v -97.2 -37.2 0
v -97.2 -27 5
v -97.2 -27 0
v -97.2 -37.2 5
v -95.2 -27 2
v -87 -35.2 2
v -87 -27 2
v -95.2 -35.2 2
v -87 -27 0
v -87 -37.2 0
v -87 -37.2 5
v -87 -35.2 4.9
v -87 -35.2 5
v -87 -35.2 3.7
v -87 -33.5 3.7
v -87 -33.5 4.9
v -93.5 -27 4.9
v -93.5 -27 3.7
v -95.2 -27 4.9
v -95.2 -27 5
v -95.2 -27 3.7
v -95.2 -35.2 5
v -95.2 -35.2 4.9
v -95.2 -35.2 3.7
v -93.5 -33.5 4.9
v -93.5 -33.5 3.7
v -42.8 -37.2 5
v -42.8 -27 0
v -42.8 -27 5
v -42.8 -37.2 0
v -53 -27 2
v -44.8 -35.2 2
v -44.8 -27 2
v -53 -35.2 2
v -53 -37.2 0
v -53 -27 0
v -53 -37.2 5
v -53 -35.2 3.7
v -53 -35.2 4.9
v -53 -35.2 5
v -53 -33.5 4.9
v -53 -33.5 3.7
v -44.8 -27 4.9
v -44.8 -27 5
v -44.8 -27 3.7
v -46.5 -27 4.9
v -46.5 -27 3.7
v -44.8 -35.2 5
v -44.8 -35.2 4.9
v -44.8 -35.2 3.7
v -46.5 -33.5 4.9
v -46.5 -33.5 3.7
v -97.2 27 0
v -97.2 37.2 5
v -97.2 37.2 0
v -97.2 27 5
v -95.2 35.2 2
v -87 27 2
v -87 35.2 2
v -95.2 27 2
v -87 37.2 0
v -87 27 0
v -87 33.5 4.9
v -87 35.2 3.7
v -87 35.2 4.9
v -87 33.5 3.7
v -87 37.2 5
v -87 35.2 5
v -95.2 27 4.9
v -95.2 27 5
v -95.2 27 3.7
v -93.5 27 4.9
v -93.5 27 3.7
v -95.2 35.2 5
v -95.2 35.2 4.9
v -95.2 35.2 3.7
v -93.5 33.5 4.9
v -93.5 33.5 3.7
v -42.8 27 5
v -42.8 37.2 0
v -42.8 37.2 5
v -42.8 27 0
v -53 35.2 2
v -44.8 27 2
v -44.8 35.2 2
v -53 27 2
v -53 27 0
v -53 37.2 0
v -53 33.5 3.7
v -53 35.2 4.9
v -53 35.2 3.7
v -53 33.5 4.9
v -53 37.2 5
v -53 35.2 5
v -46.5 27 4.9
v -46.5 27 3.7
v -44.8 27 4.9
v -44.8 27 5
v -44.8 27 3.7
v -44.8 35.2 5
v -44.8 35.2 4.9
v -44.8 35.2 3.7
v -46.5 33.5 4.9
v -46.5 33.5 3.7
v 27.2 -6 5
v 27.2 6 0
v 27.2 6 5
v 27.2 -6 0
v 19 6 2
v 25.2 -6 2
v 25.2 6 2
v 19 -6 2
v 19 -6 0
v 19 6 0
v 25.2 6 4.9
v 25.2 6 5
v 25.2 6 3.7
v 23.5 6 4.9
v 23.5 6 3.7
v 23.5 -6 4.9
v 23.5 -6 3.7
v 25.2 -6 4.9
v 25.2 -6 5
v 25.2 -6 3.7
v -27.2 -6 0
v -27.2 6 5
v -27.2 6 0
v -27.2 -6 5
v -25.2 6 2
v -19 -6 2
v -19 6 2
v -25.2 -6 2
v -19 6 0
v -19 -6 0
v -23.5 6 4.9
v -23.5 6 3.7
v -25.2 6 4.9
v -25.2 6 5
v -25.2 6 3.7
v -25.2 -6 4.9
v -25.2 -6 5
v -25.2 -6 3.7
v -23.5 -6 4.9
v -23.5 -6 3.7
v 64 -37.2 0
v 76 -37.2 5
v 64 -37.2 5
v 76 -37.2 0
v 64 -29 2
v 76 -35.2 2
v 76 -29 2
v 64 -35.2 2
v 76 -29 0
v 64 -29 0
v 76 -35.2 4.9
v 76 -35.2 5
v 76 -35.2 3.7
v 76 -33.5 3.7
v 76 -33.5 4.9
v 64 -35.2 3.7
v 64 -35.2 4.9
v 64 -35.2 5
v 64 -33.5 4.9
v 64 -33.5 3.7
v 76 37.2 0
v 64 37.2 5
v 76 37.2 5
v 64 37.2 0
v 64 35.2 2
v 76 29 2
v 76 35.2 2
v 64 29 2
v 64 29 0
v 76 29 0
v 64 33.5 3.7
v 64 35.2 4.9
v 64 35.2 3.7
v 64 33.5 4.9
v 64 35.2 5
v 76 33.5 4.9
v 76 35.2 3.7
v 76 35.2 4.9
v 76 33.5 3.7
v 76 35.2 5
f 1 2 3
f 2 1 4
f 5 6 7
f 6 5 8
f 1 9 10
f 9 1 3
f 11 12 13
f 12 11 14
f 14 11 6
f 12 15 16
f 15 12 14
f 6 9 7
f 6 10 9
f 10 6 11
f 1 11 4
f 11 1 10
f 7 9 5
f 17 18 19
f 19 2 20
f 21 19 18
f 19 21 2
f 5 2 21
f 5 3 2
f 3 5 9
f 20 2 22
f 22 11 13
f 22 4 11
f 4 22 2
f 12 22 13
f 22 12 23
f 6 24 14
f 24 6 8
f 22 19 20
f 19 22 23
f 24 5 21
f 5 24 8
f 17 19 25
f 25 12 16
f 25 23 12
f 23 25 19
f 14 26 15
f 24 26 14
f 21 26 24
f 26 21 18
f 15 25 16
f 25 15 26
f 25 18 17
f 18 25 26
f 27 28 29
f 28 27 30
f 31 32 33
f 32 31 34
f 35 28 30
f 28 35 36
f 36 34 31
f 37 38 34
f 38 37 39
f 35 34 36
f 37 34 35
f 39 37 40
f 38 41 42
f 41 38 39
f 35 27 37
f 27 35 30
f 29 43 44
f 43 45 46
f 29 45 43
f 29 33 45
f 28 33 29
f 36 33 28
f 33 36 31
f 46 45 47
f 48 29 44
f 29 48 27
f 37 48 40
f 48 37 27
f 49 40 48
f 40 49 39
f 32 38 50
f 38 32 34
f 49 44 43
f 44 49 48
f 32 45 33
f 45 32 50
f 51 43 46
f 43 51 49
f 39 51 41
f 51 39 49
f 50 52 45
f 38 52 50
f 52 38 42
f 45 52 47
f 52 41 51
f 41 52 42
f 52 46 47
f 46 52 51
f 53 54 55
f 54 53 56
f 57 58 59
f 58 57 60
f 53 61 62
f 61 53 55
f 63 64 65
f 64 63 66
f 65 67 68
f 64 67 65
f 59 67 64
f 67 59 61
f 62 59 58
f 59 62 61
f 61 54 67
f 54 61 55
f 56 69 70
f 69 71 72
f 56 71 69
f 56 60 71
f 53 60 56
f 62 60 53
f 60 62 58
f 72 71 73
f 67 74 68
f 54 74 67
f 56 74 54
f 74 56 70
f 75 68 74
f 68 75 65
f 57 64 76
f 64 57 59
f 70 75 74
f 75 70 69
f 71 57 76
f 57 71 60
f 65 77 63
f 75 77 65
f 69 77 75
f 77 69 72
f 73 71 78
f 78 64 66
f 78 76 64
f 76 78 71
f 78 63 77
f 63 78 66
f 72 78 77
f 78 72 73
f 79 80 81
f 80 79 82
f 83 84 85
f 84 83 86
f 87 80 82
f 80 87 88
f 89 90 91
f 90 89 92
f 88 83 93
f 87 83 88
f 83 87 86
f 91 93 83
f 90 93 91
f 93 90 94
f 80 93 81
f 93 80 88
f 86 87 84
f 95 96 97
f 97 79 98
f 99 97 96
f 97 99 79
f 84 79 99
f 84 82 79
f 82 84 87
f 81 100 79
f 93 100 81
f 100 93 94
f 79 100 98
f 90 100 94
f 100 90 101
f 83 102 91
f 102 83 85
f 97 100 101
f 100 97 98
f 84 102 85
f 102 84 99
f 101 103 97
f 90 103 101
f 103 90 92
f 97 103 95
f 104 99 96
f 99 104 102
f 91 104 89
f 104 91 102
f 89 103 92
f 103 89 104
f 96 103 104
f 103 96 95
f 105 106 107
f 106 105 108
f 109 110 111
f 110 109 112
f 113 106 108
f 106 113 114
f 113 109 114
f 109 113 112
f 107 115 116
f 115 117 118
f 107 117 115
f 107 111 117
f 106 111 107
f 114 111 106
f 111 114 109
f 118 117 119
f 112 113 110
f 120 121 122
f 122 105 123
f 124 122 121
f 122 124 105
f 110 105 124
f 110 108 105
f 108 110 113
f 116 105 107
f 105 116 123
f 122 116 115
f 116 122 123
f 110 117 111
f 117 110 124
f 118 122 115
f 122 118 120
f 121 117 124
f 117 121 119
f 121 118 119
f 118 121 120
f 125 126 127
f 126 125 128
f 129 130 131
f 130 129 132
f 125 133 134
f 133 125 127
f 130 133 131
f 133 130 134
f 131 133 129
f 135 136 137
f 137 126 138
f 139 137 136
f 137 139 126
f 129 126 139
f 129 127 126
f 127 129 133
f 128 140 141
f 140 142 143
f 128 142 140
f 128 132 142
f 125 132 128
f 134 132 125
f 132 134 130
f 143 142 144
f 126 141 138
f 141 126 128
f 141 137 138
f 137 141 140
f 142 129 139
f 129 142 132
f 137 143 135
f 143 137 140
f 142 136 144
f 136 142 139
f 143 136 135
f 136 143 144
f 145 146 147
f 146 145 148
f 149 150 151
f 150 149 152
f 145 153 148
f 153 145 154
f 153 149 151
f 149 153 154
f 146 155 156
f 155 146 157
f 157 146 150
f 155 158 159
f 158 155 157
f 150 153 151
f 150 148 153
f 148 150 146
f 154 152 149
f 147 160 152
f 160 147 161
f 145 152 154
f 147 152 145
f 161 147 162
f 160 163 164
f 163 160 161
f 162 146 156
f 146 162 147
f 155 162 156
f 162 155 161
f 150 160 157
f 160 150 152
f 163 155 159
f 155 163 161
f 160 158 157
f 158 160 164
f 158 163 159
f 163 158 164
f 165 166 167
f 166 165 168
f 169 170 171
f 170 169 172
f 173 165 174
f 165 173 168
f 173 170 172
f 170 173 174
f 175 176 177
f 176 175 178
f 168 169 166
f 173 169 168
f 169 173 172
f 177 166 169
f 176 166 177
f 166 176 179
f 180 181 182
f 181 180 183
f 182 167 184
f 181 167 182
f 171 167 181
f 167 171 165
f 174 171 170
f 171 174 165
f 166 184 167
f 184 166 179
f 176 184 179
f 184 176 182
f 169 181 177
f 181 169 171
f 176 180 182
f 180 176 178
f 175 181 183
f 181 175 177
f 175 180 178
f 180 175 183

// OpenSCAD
// =====================================================================
//  pcb_holder — PCB retention by corner or edge (slide-in retainer).
//
//  DESIGNED companion (invented geometry, parametric) that holds a PCB. It is NOT a
//  press-fit clip (*snap-fit*): each holder is a simple capture —*ledge* below + *lip*
//  above, separated by = PCB thickness + clearance— with the INNER side open. There
//  are two holder types, combinable:
//    · CORNER: L-shaped bracket, registers the PCB in X and Y.
//    · EDGE: straight, captures one edge — side (X) or end (Y); its position along
//      the edge is parametric (shift), just like its size.
//
//  ASSEMBLY MODEL (the user's): TWO parts, each with its own holders; the PCB is placed
//  and the two parts close over it and are screwed EXTERNALLY (the screws come from the
//  host part, not from the holder). That is why the holders carry no lead-in chamfer:
//  the PCB does not slide, the parts do. The component delivers the holder as a POSITIVE
//  + anchors.
//
//  REUSABLE across projects: PCB footprint (width × length), thickness, and size +
//  position of each holder, all parametric. Single source: consumers import it, they do
//  not copy it. (The convention is that a catalog component is developed in its own bench
//  project; this one comes WITHOUT its bench — `projects/example/` merely consumes it.
//  See `components/CLAUDE.md` § What's here.)
//
//  Units mm. Local frame: PCB footprint CENTERED in XY (origin = center of the PCB);
//  z = 0 = seating face of the holders (host floor). The PCB sits at z = STANDOFF
//  (bottom face) .. STANDOFF + PCB_T (top face); the lip overhangs above it.
// =====================================================================

// ---------- Inputs (design defaults; ADJUST = tune with a test print) ----------
PCBH_PCB_T    = 1.5; // ADJUST: PCB thickness (≈1.5; depends on the PCB)
PCBH_REF_T    = 1.6; // REFERENCE PCB thickness (the thickest standard FR-4) used to level
                     // the TOP FACE of the clip: with `level_clip` (ON), a thinner PCB
                     // does not lower the clip — the lip grows upward to this reference
                     // plane, so every clip finishes at the SAME height. The compensation
                     // is never negative: a PCB THICKER than this follows its own
                     // thickness (the clip is not trimmed).
PCBH_FIT      = 0.2; // ADJUST: XY clearance between PCB edge and wall (per side)
PCBH_SLOT_CL  = 0.2; // ADJUST: vertical clearance (gap − PCB thickness): play under the lip
PCBH_CLIP_W   = 8;   // ADJUST: CORNER clip arm along the X edge
PCBH_CLIP_D   = 8;   // ADJUST: CORNER clip arm along the Y edge
PCBH_WALL     = 2;   // ADJUST: outer wall thickness
PCBH_STANDOFF = 2;   // ADJUST: ledge height (PCB above the host floor)
PCBH_LIP      = 1.5; // ADJUST: lip overhang over the PCB (inward)
PCBH_LIP_T    = 1.2; // ADJUST: lip thickness (Z)

// EDGE clip (side / end): captures ONE straight edge at a given position.
PCBH_EDGE_LEN   = 12; // ADJUST: edge-clip length along the edge
PCBH_EDGE_DEPTH = 6;  // ADJUST: clip reach inward under the PCB (perpendicular to the edge)

// Default PCB footprint (for preview/bench; the consumer passes its own).
PCBH_DEF_W = 50; // ADJUST: default PCB width (X)
PCBH_DEF_L = 70; // ADJUST: default PCB length (Y)

PCBH_OVER = 0.01; // overlap to avoid coplanar faces

// Total holder height = ledge + PCB slot + lip. With `level_clip` the top face is
// leveled to the reference PCB (`pcb_ref_t`), never below the real one.
function pcb_holder_height(pcb_t = PCBH_PCB_T, slot_cl = PCBH_SLOT_CL,
                           standoff = PCBH_STANDOFF, lip_t = PCBH_LIP_T,
                           pcb_ref_t = PCBH_REF_T, level_clip = true) =
  standoff + (level_clip ? max(pcb_t, pcb_ref_t) : pcb_t) + slot_cl + lip_t;

// ---------- Anchors + accessors (functions, NOT top-level vars) ----------
// XY center of a PCB corner (sx, sy ∈ {−1,1}).
function pcb_holder_corner_xy(sx, sy, width, length) = [sx * width / 2, sy * length / 2];

// anchor(name, ...): component reference.
//   "pcb_size" -> [W, L, pcb_t] · "seat_z" -> z of the PCB bottom face (= standoff)
//   "height" -> total holder height · "corner_lt/rt/lb/rb" -> [x, y, seat_z] of each corner
function pcb_holder_anchor(name, width = PCBH_DEF_W, length = PCBH_DEF_L,
                           pcb_t = PCBH_PCB_T, standoff = PCBH_STANDOFF,
                           pcb_ref_t = PCBH_REF_T, level_clip = true) =
    name == "pcb_size" ? [width, length, pcb_t]
  : name == "seat_z"   ? standoff
  : name == "height"   ? pcb_holder_height(pcb_t = pcb_t, standoff = standoff,
                                           pcb_ref_t = pcb_ref_t, level_clip = level_clip)
  : name == "corner_lb" ? [pcb_holder_corner_xy(-1, -1, width, length)[0], pcb_holder_corner_xy(-1, -1, width, length)[1], standoff]
  : name == "corner_rb" ? [pcb_holder_corner_xy( 1, -1, width, length)[0], pcb_holder_corner_xy( 1, -1, width, length)[1], standoff]
  : name == "corner_lt" ? [pcb_holder_corner_xy(-1,  1, width, length)[0], pcb_holder_corner_xy(-1,  1, width, length)[1], standoff]
  : name == "corner_rt" ? [pcb_holder_corner_xy( 1,  1, width, length)[0], pcb_holder_corner_xy( 1,  1, width, length)[1], standoff]
  : undef;

// ---------- Private helper: CORNER clip in the (+X,+Y) quadrant ----------
// Explicit coordinates at the +,+ corner; the other 3 via scale([sx,sy,1]) (mirror).
// L-shaped walls ONLY on the two OUTER edges (+X,+Y); the inner side (toward the
// center of the PCB) is left OPEN — the corner goes in there and the two halves meet.
// rim    = INWARD reach of the ledge/base under the PCB edge (thin rim; instead of
//          the solid clip_w×clip_d base). Default = clip_w (compat).
// base_h = height of the BASE/foot that extends the clip BEYOND the +Y edge of the PCB
//          (in a host printed on its side, that direction = toward the print bed). base_h<=0
//          → no base (the consumer adds the support, as before). The foot is a THIN
//          section (thickness `rim` in Z) that backs the overhang so it is not left in air.
module _pcb_holder_corner_pp(width, length, pcb_t, fit, slot_cl, clip_w, clip_d,
                             wall, standoff, lip, lip_t, rim, base_h,
                             pcb_ref_t, level_clip) {
  hw = width / 2;  hl = length / 2;
  xo = hw + fit;   yo = hl + fit;            // inner faces of the outer walls
  xout = xo + wall; yout = yo + wall;        // outer faces
  x_in = hw - clip_w; y_in = hl - clip_d;    // inward reach of the clip (X/Y edge)
  // eff_t levels the TOP FACE of the clip: with level_clip, a PCB thinner than the
  // reference does not lower the clip (the lip grows upward). It never trims below the
  // real PCB → the compensation is never negative.
  eff_t = level_clip ? max(pcb_t, pcb_ref_t) : pcb_t;
  Htop  = standoff + eff_t + slot_cl + lip_t;
  z_lip = standoff + pcb_t + slot_cl;        // bottom face of the lip (follows the REAL PCB)
  union() {
    // Ledge/base = L-shaped rim (reach `rim`), not a solid block → less material behind the PCB.
    translate([x_in, hl - rim, 0]) cube([xout - x_in, yout - (hl - rim), standoff]);   // +Y rim
    translate([hw - rim, y_in, 0]) cube([xout - (hw - rim), yout - y_in, standoff]);   // +X rim
    translate([x_in, yo, 0]) cube([xout - x_in, wall, Htop]);                     // +Y wall
    translate([xo, y_in, 0]) cube([wall, yout - y_in, Htop]);                     // +X wall
    translate([x_in, hl - lip, z_lip]) cube([xout - x_in, yout - (hl - lip), lip_t]); // +Y lip
    translate([hw - lip, y_in, z_lip]) cube([xout - (hw - lip), yout - y_in, lip_t]); // +X lip
    // BASE/foot: extends the clip beyond the +Y edge (toward the bed/floor) with the FULL
    // SECTION of the clip (z 0..Htop) → same width as the grip (no step) and solid down to
    // the floor. (The thin rim behind the PCB is the ledge above, a separate thing.)
    if (base_h > 0)
      translate([x_in, yout, 0]) cube([xout - x_in, base_h, Htop]);
  }
}

// ---------- POSITIVE — one CORNER clip (at corner sx,sy of the footprint) ----------
module pcb_holder_corner_clip(
  sx = 1, sy = 1,
  width = PCBH_DEF_W, length = PCBH_DEF_L,
  pcb_t = PCBH_PCB_T, fit = PCBH_FIT, slot_cl = PCBH_SLOT_CL,
  clip_w = PCBH_CLIP_W, clip_d = PCBH_CLIP_D, wall = PCBH_WALL,
  standoff = PCBH_STANDOFF, lip = PCBH_LIP, lip_t = PCBH_LIP_T,
  rim = undef, base_h = 0,
  pcb_ref_t = PCBH_REF_T, level_clip = true
) {
  // default rim = clip_w ("wide" base as before); pass it small for a thin rim.
  rim_e = is_undef(rim) ? clip_w : rim;
  // sx,sy ∈ {−1,1}: scale mirrors the +,+ corner to the requested quadrant (identity if 1).
  scale([sx, sy, 1])
    _pcb_holder_corner_pp(width, length, pcb_t, fit, slot_cl, clip_w, clip_d,
                          wall, standoff, lip, lip_t, rim_e, base_h,
                          pcb_ref_t, level_clip);
}

// ---------- Private helper: straight EDGE clip (canonical: +X edge at x=half) ----------
// A single outer wall + ledge + lip, inner side open. `pos` = center along the edge
// (shift); `len` = length; `depth` = reach inward under the PCB.
module _pcb_holder_edge_pp(half, pos, len, depth, pcb_t, fit, slot_cl,
                           wall, standoff, lip, lip_t, pcb_ref_t, level_clip) {
  xo = half + fit;  xout = xo + wall;
  x_in = half - depth;
  y0 = pos - len / 2;
  eff_t = level_clip ? max(pcb_t, pcb_ref_t) : pcb_t;  // levels the top face of the clip
  Htop  = standoff + eff_t + slot_cl + lip_t;
  z_lip = standoff + pcb_t + slot_cl;                  // lip follows the REAL PCB
  union() {
    translate([x_in, y0, 0]) cube([xout - x_in, len, standoff]);                  // ledge/base
    translate([xo, y0, 0]) cube([wall, len, Htop]);                               // outer wall
    translate([half - lip, y0, z_lip]) cube([xout - (half - lip), len, lip_t]);   // lip
  }
}

// ---------- POSITIVE — one EDGE clip (side / end) ----------
// side ∈ "left"|"right" (sides, X axis) | "bottom"|"top" (ends, Y axis).
// pos = SHIFT of the center along the edge (0 = centered; + toward the edge's +axis).
// len / depth = holder size (along the edge / inward).
module pcb_holder_edge_clip(
  side = "left", pos = 0, len = PCBH_EDGE_LEN, depth = PCBH_EDGE_DEPTH,
  width = PCBH_DEF_W, length = PCBH_DEF_L,
  pcb_t = PCBH_PCB_T, fit = PCBH_FIT, slot_cl = PCBH_SLOT_CL,
  wall = PCBH_WALL, standoff = PCBH_STANDOFF, lip = PCBH_LIP, lip_t = PCBH_LIP_T,
  pcb_ref_t = PCBH_REF_T, level_clip = true
) {
  hw = width / 2;  hl = length / 2;
  // Canonical = +X edge; the other 3 faces by mirror/rotation (they map the open side too).
  if (side == "right")
    _pcb_holder_edge_pp(hw, pos, len, depth, pcb_t, fit, slot_cl, wall, standoff, lip, lip_t, pcb_ref_t, level_clip);
  else if (side == "left")
    mirror([1, 0, 0]) _pcb_holder_edge_pp(hw, pos, len, depth, pcb_t, fit, slot_cl, wall, standoff, lip, lip_t, pcb_ref_t, level_clip);
  else if (side == "top")
    rotate([0, 0, 90]) _pcb_holder_edge_pp(hl, -pos, len, depth, pcb_t, fit, slot_cl, wall, standoff, lip, lip_t, pcb_ref_t, level_clip);
  else if (side == "bottom")
    rotate([0, 0, -90]) _pcb_holder_edge_pp(hl, pos, len, depth, pcb_t, fit, slot_cl, wall, standoff, lip, lip_t, pcb_ref_t, level_clip);
}

// ---------- POSITIVE — placement: corners and/or edges ----------
// corners = list of [sx,sy] (default all 4).
// edges   = list of [side, pos?, len?, depth?] — pos = shift (def 0), len/depth = holder
//           size (def PCBH_EDGE_LEN / PCBH_EDGE_DEPTH). E.g.: ["left", 12] = left side
//           clip shifted +12 in Y; ["top", -8, 20] = top end at −8 in X, 20 long. For the
//           2-part assembly, pass each half its own holders.
module pcb_holder(
  width = PCBH_DEF_W, length = PCBH_DEF_L,
  corners = [[-1, -1], [1, -1], [-1, 1], [1, 1]],
  edges = [],
  pcb_t = PCBH_PCB_T, fit = PCBH_FIT, slot_cl = PCBH_SLOT_CL,
  clip_w = PCBH_CLIP_W, clip_d = PCBH_CLIP_D, wall = PCBH_WALL,
  standoff = PCBH_STANDOFF, lip = PCBH_LIP, lip_t = PCBH_LIP_T,
  edge_len = PCBH_EDGE_LEN, edge_depth = PCBH_EDGE_DEPTH,
  pcb_ref_t = PCBH_REF_T, level_clip = true
) {
  for (c = corners)
    pcb_holder_corner_clip(c[0], c[1], width, length, pcb_t, fit, slot_cl,
                           clip_w, clip_d, wall, standoff, lip, lip_t,
                           pcb_ref_t = pcb_ref_t, level_clip = level_clip);
  for (e = edges)
    pcb_holder_edge_clip(
      e[0],
      is_undef(e[1]) ? 0 : e[1],          // pos (shift)
      is_undef(e[2]) ? edge_len : e[2],   // len
      is_undef(e[3]) ? edge_depth : e[3], // depth
      width, length, pcb_t, fit, slot_cl, wall, standoff, lip, lip_t,
      pcb_ref_t = pcb_ref_t, level_clip = level_clip);
}

// ---------- REFERENCE — the PCB in its seated position (visual / clash) ----------
module pcb_holder_pcb(width = PCBH_DEF_W, length = PCBH_DEF_L,
                      pcb_t = PCBH_PCB_T, standoff = PCBH_STANDOFF) {
  color("#2e6e3f")
    translate([0, 0, standoff + pcb_t / 2])
      cube([width, length, pcb_t], center = true);
}

// ---------- Self-preview (top-level; `use <...>` ignores it — never `include`) ----------
// Three configurations (each as 2 colored halves + ref PCB): corners | sides | ends.
$fn = 48;
translate([-70, 0, 0]) {           // corners
  color("#caa14a") pcb_holder(corners = [[-1, -1], [1, -1]]);
  color("#7fa6c9") pcb_holder(corners = [[-1, 1], [1, 1]]);
  %pcb_holder_pcb();
}
translate([0, 0, 0]) {             // sides
  color("#caa14a") pcb_holder(corners = [], edges = [["left", 0]]);
  color("#7fa6c9") pcb_holder(corners = [], edges = [["right", 0]]);
  %pcb_holder_pcb();
}
translate([70, 0, 0]) {            // ends
  color("#caa14a") pcb_holder(corners = [], edges = [["bottom", 0]]);
  color("#7fa6c9") pcb_holder(corners = [], edges = [["top", 0]]);
  %pcb_holder_pcb();
}
